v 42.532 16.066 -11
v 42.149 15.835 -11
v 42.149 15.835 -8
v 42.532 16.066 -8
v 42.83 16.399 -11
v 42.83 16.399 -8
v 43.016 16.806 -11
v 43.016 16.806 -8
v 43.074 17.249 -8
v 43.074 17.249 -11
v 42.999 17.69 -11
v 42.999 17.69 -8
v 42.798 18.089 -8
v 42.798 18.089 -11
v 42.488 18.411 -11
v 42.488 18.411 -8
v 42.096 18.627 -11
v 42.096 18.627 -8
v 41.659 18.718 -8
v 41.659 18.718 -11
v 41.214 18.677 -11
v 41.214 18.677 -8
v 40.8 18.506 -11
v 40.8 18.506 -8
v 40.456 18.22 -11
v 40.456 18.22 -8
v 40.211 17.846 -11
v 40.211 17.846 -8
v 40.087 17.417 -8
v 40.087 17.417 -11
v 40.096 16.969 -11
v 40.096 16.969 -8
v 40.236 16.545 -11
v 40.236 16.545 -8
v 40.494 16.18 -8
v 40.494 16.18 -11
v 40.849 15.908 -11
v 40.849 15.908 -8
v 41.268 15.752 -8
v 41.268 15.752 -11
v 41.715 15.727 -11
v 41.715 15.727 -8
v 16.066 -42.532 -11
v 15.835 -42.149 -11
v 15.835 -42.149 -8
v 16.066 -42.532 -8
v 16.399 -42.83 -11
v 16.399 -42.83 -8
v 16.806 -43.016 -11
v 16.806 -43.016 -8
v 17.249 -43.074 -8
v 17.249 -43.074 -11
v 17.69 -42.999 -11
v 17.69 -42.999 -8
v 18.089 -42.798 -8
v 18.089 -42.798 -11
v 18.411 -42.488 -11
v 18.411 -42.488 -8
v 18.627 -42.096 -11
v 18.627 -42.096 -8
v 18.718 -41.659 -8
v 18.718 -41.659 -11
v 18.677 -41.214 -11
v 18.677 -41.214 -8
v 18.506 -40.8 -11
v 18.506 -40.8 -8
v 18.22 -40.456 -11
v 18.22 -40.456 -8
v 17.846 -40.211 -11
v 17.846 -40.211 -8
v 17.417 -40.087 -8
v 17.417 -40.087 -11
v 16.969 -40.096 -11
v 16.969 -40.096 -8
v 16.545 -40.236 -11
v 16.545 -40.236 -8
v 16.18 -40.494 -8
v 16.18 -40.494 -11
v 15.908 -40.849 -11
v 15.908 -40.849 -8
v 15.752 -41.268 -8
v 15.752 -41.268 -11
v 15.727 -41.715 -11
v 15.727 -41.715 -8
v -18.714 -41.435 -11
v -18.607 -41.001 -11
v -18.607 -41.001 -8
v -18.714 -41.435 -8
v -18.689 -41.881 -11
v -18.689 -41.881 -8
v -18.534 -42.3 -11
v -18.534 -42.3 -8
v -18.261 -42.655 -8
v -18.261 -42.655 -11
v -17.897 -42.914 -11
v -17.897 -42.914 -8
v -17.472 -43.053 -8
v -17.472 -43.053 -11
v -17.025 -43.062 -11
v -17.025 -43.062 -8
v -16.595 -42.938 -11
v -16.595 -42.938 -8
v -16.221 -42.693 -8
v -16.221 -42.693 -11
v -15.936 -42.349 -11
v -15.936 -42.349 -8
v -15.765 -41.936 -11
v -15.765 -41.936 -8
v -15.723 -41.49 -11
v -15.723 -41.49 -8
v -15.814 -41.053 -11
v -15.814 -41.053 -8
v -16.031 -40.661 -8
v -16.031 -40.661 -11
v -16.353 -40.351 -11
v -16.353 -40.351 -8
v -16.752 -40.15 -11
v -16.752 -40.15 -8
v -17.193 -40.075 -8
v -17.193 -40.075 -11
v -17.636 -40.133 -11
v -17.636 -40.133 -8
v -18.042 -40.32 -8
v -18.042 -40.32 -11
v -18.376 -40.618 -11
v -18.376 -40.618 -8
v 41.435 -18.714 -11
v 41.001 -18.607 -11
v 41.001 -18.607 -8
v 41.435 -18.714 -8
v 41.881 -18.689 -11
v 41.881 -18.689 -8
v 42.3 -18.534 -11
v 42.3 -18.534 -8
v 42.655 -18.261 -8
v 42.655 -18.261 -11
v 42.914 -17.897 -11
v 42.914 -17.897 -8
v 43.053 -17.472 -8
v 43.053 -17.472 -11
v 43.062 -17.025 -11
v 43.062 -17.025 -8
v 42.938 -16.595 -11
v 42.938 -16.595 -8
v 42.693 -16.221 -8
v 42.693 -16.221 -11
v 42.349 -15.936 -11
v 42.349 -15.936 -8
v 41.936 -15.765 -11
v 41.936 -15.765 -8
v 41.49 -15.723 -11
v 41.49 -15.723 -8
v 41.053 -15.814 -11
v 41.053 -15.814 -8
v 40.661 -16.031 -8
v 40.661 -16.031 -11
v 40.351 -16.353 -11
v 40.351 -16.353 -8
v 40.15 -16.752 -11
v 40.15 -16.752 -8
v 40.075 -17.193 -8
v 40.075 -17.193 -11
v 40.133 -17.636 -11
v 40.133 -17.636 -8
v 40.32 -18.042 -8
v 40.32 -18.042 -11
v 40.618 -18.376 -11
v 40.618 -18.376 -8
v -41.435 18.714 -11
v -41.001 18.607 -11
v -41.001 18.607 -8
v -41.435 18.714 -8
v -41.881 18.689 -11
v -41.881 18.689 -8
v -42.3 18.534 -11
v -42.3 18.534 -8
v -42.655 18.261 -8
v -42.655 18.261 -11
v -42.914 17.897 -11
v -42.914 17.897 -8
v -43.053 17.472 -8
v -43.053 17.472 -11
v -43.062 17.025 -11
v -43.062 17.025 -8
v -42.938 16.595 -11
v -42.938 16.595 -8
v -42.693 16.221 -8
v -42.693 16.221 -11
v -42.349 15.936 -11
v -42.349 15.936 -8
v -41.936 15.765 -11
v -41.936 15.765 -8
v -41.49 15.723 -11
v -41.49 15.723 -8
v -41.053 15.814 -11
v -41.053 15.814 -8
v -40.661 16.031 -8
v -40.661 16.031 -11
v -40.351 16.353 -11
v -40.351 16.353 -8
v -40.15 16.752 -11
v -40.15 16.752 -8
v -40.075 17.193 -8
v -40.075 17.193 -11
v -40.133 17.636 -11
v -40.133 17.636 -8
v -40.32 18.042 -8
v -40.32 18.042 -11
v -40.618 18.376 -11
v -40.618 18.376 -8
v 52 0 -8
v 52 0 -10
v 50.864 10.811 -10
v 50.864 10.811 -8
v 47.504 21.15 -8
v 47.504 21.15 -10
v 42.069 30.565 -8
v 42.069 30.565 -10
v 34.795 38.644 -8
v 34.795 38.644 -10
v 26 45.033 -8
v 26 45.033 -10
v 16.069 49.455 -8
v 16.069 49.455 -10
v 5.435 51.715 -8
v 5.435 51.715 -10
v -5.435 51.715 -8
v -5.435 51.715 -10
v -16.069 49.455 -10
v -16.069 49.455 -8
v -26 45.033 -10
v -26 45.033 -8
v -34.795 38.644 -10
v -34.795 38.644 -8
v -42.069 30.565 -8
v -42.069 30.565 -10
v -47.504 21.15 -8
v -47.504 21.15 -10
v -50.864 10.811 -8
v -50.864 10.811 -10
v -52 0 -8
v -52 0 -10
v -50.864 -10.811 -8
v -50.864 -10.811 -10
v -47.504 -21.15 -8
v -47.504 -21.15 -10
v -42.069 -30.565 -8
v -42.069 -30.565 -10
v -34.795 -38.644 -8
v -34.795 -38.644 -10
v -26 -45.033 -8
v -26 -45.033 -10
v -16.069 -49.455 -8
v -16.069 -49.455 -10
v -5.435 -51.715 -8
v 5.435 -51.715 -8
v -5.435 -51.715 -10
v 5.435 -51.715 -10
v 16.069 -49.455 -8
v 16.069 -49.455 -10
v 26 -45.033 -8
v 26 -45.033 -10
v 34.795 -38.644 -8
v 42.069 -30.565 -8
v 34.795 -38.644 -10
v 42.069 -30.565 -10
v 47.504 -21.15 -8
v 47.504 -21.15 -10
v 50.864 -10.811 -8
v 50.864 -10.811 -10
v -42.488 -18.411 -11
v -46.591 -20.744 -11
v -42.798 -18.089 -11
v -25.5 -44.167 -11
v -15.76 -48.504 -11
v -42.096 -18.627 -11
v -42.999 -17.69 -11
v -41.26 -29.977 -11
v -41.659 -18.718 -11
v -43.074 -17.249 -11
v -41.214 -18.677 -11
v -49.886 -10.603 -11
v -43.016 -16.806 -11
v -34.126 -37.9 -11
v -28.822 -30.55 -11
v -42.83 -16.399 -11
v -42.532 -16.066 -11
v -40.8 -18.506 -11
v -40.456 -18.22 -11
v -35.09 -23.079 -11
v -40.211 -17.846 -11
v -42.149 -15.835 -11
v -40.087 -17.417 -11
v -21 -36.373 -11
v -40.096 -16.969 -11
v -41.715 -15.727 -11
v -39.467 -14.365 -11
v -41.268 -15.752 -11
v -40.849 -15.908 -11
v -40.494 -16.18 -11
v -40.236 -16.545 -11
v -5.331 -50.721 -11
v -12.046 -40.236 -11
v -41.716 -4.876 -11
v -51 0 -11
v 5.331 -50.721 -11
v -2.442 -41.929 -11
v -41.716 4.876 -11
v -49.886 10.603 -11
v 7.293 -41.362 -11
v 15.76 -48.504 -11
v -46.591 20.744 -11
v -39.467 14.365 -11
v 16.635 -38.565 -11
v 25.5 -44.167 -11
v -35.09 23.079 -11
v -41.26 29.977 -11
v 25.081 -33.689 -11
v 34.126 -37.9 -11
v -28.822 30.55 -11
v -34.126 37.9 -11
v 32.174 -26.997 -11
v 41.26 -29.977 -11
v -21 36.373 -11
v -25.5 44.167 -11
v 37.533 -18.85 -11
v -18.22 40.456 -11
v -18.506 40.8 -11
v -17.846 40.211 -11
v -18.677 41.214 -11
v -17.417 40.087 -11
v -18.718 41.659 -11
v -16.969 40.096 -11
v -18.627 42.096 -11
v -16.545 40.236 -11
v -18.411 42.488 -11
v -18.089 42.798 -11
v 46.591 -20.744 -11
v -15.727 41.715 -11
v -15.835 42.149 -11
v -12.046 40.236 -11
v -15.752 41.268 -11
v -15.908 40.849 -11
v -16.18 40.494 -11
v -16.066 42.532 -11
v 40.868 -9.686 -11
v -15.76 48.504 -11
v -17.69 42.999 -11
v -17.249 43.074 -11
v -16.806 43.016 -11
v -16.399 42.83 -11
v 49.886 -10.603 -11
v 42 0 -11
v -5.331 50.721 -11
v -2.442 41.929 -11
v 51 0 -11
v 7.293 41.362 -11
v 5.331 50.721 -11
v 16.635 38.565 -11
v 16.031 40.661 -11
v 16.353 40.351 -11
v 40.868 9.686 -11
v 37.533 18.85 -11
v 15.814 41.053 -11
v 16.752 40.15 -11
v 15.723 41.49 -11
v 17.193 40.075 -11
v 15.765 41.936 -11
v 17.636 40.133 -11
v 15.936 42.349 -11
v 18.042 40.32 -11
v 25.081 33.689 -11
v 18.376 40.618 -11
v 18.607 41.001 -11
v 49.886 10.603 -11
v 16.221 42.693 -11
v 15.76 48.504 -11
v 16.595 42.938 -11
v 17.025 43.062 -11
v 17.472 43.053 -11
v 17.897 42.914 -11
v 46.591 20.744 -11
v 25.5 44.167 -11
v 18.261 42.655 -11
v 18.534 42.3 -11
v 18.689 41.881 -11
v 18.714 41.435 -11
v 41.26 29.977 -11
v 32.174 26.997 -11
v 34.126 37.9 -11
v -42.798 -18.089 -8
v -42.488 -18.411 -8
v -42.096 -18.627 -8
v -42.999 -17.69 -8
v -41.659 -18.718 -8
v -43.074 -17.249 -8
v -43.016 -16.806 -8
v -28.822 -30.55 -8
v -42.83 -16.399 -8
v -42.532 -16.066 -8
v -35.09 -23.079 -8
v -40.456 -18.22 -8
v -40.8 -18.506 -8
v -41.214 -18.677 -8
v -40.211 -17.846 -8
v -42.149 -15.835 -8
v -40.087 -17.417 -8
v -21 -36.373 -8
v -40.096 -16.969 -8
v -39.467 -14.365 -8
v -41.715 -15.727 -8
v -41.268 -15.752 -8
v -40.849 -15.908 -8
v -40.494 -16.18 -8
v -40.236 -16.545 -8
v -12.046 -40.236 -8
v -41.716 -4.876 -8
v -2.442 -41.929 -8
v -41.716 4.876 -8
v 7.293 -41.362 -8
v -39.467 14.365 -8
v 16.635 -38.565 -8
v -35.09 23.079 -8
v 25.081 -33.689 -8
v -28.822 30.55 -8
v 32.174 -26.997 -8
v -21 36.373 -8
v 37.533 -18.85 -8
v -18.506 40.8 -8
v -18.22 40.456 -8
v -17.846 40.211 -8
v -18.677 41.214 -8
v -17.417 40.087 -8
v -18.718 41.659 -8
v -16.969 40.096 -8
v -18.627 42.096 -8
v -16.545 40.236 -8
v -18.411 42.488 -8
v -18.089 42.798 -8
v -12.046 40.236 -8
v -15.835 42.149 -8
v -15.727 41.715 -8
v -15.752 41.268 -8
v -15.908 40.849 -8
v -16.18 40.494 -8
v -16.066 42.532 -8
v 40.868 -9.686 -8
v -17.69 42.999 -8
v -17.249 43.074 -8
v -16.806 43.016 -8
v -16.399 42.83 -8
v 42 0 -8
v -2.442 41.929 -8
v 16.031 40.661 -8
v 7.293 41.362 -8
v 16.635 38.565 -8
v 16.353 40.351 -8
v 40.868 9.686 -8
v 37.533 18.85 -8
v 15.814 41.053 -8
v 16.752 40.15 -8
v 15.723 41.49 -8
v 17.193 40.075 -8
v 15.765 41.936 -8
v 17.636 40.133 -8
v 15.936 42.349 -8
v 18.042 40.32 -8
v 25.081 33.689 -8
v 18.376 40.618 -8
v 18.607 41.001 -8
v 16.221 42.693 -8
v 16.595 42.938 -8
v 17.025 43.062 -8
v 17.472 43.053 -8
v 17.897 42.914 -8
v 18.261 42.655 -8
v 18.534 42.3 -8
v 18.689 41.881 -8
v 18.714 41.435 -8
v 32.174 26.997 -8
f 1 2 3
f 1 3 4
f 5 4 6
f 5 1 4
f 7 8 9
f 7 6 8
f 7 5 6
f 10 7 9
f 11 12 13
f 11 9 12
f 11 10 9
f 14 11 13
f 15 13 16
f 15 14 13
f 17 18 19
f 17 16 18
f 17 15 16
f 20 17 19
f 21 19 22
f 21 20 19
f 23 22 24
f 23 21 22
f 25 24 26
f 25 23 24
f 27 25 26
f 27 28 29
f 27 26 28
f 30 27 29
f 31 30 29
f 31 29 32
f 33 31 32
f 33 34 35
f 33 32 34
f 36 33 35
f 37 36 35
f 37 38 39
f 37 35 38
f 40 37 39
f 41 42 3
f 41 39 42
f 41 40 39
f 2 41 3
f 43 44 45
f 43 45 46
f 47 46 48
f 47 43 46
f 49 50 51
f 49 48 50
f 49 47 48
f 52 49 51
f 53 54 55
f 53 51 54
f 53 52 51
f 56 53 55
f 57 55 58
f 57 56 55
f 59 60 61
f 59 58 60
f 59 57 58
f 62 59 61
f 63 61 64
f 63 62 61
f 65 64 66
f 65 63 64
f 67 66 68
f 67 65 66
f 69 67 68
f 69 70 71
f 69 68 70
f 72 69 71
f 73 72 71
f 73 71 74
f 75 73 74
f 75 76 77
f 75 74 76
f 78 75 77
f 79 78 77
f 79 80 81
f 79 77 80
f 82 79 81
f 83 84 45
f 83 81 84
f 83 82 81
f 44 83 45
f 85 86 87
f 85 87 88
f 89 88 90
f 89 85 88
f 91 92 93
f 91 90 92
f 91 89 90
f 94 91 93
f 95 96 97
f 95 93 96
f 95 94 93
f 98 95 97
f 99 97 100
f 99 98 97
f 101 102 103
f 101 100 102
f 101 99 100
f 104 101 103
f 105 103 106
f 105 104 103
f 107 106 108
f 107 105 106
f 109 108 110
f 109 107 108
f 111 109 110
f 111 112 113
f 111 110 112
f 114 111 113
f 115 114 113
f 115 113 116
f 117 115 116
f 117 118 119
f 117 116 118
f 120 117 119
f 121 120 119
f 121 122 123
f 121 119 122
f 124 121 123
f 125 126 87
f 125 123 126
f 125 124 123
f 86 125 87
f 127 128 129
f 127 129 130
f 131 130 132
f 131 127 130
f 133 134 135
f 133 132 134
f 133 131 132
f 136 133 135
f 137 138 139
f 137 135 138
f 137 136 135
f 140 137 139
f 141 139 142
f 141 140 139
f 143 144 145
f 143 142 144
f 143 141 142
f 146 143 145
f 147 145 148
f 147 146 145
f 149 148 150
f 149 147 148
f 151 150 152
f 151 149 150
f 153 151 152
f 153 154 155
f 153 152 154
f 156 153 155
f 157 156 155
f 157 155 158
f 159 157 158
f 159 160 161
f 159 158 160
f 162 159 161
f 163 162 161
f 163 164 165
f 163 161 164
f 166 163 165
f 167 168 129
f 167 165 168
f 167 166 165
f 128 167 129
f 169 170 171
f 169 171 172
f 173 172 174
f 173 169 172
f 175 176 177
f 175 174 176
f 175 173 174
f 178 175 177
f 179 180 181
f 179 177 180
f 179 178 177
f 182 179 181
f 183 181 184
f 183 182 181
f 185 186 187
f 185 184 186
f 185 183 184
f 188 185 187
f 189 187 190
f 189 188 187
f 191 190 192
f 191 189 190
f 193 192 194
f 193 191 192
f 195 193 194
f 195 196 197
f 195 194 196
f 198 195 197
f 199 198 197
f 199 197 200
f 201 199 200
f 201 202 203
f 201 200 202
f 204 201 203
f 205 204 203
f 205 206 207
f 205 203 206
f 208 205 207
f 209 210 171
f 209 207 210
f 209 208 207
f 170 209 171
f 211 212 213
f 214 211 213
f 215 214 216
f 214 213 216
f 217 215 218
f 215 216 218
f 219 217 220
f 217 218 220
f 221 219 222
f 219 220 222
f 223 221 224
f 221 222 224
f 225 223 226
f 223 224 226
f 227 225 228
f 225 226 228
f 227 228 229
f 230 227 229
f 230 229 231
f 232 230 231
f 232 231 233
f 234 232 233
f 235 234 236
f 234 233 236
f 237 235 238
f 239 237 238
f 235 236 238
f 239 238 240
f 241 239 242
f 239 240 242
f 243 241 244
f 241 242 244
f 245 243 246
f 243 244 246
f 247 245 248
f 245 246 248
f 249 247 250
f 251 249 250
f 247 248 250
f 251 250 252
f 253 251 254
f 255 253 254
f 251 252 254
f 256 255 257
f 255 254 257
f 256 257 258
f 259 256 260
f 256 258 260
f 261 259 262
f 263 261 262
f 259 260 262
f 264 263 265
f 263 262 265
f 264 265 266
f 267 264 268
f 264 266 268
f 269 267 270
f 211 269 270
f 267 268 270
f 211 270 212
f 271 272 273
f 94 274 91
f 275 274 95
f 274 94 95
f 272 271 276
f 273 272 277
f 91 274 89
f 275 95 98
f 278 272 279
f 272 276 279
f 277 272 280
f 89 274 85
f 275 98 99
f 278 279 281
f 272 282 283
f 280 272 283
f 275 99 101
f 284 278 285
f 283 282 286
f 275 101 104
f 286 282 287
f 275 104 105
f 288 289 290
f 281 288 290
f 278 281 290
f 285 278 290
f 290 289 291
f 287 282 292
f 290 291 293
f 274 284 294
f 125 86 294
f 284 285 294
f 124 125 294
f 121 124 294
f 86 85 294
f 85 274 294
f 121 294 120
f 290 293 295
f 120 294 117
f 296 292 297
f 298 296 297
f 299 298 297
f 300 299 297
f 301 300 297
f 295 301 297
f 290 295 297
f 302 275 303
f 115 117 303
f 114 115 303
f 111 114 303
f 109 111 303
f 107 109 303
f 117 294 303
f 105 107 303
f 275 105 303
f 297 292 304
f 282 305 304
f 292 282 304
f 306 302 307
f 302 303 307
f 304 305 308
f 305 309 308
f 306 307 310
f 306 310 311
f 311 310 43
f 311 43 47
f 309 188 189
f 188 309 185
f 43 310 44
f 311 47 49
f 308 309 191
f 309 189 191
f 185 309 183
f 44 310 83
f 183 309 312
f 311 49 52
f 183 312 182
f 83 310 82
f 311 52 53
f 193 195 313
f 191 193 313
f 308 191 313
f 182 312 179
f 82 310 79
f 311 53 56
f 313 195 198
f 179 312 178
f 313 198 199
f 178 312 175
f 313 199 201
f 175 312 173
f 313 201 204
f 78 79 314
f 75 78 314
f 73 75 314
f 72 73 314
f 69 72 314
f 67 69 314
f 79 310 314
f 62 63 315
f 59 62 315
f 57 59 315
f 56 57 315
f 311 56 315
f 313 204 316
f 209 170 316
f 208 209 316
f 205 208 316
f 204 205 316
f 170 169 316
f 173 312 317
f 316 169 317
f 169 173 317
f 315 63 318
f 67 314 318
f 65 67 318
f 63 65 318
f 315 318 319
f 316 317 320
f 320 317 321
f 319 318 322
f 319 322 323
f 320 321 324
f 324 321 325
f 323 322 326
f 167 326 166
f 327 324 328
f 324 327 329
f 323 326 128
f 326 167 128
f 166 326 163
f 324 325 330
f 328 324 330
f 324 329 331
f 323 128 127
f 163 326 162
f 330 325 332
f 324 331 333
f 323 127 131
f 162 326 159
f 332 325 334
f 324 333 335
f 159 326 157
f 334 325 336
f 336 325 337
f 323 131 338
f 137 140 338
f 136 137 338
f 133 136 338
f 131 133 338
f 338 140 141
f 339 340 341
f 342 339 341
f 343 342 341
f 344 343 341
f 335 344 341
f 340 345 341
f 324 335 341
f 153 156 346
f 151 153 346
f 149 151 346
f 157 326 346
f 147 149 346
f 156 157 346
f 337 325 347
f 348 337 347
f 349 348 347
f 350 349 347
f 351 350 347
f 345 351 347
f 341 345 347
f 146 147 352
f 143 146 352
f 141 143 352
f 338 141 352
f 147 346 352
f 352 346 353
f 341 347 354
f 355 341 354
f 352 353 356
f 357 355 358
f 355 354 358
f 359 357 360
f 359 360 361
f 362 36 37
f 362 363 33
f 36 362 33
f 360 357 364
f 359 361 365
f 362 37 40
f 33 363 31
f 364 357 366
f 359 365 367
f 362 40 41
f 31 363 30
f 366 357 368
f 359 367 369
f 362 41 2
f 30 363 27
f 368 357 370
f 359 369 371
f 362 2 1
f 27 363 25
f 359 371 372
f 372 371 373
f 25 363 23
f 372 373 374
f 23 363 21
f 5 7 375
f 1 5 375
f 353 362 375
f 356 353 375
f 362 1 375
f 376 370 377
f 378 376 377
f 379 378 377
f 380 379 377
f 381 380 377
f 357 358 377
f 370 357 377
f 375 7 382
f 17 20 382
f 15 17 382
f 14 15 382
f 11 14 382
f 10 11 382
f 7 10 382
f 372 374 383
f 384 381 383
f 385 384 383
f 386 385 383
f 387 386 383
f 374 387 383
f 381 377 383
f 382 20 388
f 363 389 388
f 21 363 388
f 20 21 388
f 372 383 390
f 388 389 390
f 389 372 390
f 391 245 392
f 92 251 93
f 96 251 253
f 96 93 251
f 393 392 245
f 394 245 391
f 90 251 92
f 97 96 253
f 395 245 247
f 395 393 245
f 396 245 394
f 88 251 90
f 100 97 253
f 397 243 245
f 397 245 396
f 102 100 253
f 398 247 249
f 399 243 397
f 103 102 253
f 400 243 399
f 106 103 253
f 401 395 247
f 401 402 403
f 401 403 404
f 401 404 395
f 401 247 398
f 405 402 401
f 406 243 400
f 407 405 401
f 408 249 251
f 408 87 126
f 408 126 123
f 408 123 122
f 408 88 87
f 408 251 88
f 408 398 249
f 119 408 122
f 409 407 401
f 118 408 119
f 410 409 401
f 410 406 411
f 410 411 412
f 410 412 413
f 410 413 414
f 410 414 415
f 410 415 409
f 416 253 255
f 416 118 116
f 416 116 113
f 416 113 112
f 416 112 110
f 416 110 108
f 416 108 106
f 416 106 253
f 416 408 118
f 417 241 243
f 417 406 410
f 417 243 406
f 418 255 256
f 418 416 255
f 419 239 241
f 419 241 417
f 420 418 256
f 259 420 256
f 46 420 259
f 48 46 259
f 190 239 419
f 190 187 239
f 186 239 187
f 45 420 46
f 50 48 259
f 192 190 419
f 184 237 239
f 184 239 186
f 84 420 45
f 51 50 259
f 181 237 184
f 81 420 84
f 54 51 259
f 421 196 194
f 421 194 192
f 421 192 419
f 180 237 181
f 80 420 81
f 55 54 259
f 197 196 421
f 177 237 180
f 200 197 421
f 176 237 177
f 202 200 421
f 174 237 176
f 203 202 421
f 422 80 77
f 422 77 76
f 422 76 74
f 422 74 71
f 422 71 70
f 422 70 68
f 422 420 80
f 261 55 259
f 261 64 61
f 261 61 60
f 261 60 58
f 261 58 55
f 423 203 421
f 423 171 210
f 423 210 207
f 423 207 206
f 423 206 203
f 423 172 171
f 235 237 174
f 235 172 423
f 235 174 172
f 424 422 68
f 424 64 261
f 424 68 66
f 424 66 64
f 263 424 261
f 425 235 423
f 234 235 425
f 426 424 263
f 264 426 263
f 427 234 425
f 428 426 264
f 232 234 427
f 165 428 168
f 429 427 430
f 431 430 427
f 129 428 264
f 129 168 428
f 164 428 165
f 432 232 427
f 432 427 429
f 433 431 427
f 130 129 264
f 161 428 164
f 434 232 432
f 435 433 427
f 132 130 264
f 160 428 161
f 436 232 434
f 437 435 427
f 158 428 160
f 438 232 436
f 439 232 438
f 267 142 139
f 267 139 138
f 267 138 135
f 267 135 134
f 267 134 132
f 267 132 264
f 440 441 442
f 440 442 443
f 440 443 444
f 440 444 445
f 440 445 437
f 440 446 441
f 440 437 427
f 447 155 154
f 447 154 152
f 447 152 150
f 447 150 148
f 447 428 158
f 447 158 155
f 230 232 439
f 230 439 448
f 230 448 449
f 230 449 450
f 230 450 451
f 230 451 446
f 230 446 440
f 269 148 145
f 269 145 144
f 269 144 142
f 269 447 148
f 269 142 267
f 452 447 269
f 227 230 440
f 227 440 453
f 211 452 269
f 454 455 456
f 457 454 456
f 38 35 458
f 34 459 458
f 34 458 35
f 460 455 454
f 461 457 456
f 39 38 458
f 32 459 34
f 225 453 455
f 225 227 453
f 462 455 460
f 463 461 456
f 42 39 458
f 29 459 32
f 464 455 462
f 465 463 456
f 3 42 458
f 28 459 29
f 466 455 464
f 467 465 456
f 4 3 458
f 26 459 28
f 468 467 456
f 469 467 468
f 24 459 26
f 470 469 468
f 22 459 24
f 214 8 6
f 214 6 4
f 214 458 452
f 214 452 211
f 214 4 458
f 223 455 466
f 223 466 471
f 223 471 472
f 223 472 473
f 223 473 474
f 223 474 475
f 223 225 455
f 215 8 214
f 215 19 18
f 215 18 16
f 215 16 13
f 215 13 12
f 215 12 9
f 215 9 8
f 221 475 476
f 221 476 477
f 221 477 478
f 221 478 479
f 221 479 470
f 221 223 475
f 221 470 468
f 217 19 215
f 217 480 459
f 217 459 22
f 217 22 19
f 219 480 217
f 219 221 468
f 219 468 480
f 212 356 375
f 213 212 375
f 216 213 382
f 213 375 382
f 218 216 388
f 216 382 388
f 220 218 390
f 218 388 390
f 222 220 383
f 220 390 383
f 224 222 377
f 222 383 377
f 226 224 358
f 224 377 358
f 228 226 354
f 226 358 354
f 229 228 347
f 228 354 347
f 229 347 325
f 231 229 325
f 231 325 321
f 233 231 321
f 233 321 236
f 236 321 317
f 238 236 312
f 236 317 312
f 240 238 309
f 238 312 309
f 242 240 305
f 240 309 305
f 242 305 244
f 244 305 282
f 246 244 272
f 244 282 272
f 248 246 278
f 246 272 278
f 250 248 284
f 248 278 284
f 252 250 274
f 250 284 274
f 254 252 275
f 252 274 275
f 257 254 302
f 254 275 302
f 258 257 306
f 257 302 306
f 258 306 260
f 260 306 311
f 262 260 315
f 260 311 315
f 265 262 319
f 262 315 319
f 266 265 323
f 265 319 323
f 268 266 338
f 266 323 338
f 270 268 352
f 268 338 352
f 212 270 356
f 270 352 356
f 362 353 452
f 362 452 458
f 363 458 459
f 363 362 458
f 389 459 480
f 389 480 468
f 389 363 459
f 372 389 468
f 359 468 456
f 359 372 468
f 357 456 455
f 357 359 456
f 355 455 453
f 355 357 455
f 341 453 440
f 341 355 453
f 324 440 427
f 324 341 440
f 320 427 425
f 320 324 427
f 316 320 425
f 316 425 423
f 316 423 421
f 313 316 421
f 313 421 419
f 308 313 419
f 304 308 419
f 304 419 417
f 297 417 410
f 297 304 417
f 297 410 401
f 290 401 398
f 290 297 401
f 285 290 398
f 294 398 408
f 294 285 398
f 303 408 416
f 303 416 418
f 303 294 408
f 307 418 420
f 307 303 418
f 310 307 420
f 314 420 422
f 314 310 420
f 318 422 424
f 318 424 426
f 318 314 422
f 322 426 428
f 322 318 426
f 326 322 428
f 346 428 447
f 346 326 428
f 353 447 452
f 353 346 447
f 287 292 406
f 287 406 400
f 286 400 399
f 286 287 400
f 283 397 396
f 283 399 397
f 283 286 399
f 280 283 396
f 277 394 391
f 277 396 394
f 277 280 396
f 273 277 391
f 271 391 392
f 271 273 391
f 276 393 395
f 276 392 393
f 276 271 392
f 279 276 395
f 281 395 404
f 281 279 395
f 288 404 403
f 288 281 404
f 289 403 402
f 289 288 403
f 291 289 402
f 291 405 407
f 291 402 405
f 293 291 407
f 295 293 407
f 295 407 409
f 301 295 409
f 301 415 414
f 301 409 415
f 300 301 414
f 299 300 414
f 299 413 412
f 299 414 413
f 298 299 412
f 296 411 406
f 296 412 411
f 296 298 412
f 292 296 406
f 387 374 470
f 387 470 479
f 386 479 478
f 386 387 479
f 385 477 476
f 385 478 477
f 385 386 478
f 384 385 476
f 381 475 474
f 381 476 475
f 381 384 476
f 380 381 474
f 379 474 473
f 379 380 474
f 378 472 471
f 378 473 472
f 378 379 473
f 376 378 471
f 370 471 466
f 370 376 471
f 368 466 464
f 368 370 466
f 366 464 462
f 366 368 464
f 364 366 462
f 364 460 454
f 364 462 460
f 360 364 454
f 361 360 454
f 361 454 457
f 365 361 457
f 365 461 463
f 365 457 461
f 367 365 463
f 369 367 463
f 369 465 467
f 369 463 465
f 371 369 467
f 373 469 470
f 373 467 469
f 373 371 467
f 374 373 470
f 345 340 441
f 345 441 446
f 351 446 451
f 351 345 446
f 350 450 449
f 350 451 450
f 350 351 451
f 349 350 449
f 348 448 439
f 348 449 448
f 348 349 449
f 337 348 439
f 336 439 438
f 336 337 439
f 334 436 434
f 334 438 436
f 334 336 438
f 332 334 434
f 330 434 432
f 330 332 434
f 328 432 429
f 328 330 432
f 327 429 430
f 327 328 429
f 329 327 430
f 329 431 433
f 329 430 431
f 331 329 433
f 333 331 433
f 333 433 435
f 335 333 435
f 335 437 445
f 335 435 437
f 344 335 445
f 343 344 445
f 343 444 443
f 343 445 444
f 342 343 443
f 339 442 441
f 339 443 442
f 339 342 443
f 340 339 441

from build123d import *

# Parameters (mm, degrees)
CYLINDER658_R               = 1.5
CYLINDER658_DEPTH           = 20
CYLINDER658_PLACEMENT_ANGLE = 45
CYLINDER659_R               = 1.5
CYLINDER659_DEPTH           = 20
CYLINDER652_R               = 1.5
CYLINDER652_DEPTH           = 20
CYLINDER652_PLACEMENT_ANGLE = 135
CYLINDER655_R               = 1.5
CYLINDER655_DEPTH           = 20
CYLINDER657_R               = 1.5
CYLINDER657_DEPTH           = 20
CYLINDER657_PLACEMENT_ANGLE = 225
CYLINDER654_R               = 1.5
CYLINDER654_DEPTH           = 20
CYLINDER656_R               = 1.5
CYLINDER656_DEPTH           = 20
CYLINDER656_PLACEMENT_ANGLE = 45
CYLINDER653_R               = 1.5
CYLINDER653_DEPTH           = 20
COMPOUND660_PLACEMENT_ANGLE = 22.5
TUBE040_R                   = 52
TUBE040_R_2                 = 42
TUBE040_DEPTH               = 3
CHAMFER018_SIZE             = 1


with BuildPart() as v_lec658:
    # Cylinder658 → Cylinder658 (new body)
    with BuildSketch(Plane.XY):
        Circle(CYLINDER658_R)
    extrude(amount=CYLINDER658_DEPTH)


with BuildPart() as v_lec658_1:
    # Cylinder658 placement: moved
    add(v_lec658.part.moved(Location((-31.819805, 31.819805, -18))).rotate(Axis((-31.819805, 31.819805, -18), (0, 0, 1)), CYLINDER658_PLACEMENT_ANGLE))


with BuildPart() as v_lec659:
    # Cylinder659 → Cylinder659 (new body)
    with BuildSketch(Plane(origin=(-45, 0, -18), x_dir=(0, 1, 0), z_dir=(0, 0, 1))):
        Circle(CYLINDER659_R)
    extrude(amount=CYLINDER659_DEPTH)


with BuildPart() as v_lec652:
    # Cylinder652 → Cylinder652 (new body)
    with BuildSketch(Plane.XY):
        Circle(CYLINDER652_R)
    extrude(amount=CYLINDER652_DEPTH)


with BuildPart() as v_lec652_1:
    # Cylinder652 placement: moved
    add(v_lec652.part.moved(Location((-31.819805, -31.819805, -18))).rotate(Axis((-31.819805, -31.819805, -18), (0, 0, 1)), CYLINDER652_PLACEMENT_ANGLE))


with BuildPart() as v_lec655:
    # Cylinder655 → Cylinder655 (new body)
    with BuildSketch(Plane(origin=(0, -45, -18), x_dir=(-1, 0, 0), z_dir=(0, 0, 1))):
        Circle(CYLINDER655_R)
    extrude(amount=CYLINDER655_DEPTH)


with BuildPart() as v_lec657:
    # Cylinder657 → Cylinder657 (new body)
    with BuildSketch(Plane.XY):
        Circle(CYLINDER657_R)
    extrude(amount=CYLINDER657_DEPTH)


with BuildPart() as v_lec657_1:
    # Cylinder657 placement: moved
    add(v_lec657.part.moved(Location((31.819805, -31.819805, -18))).rotate(Axis((31.819805, -31.819805, -18), (0, 0, 1)), CYLINDER657_PLACEMENT_ANGLE))


with BuildPart() as v_lec654:
    # Cylinder654 → Cylinder654 (new body)
    with BuildSketch(Plane(origin=(45, 0, -18), x_dir=(0, -1, 0), z_dir=(0, 0, 1))):
        Circle(CYLINDER654_R)
    extrude(amount=CYLINDER654_DEPTH)


with BuildPart() as v_lec656:
    # Cylinder656 → Cylinder656 (new body)
    with BuildSketch(Plane.XY):
        Circle(CYLINDER656_R)
    extrude(amount=CYLINDER656_DEPTH)


with BuildPart() as v_lec656_1:
    # Cylinder656 placement: moved
    add(v_lec656.part.moved(Location((31.819805, 31.819805, -18))).rotate(Axis((31.819805, 31.819805, -18), (0, 0, -1)), CYLINDER656_PLACEMENT_ANGLE))


with BuildPart() as compound660:
    # Cylinder653 → Cylinder653 (new body)
    with BuildSketch(Plane(origin=(0, 45, -18), x_dir=(1, 0, 0), z_dir=(0, 0, 1))):
        Circle(CYLINDER653_R)
    extrude(amount=CYLINDER653_DEPTH)

    # Compound660: union Válec658, Válec659, Válec652, Válec655, Válec657, Válec654, Válec656
    add(v_lec658_1.part)
    add(v_lec659.part)
    add(v_lec652_1.part)
    add(v_lec655.part)
    add(v_lec657_1.part)
    add(v_lec654.part)
    add(v_lec656_1.part)


with BuildPart() as compound660_1:
    # Compound660 placement: moved
    add(compound660.part.rotate(Axis((0, 0, 0), (0, 0, 1)), COMPOUND660_PLACEMENT_ANGLE))


with BuildPart() as j_max_motor_high_washer_a:
    # Tube040 → Tube040 (new body)
    with BuildSketch(Plane.XY.offset(-11)):
        Circle(TUBE040_R)
        Circle(TUBE040_R_2, mode=Mode.SUBTRACT)
    extrude(amount=TUBE040_DEPTH)

    # Cut290: cut Compound660
    add(compound660_1.part, mode=Mode.SUBTRACT)


with BuildPart() as j_max_motor_high_washer_a_1:
    # Cut290 placement: moved
    add(j_max_motor_high_washer_a.part.moved(Location((0, 0, -4))))

    # Chamfer018
    chamfer018_edges = [j_max_motor_high_washer_a_1.edges().sort_by_distance(p)[0] for p in [
        (-52, 0, -15),
    ]]
    chamfer(chamfer018_edges, length=CHAMFER018_SIZE)


with BuildPart() as j_max_motor_high_washer_a_2:
    # Chamfer018 placement: moved
    add(j_max_motor_high_washer_a_1.part.moved(Location((0, 0, 4))))


solid = j_max_motor_high_washer_a_2.part
